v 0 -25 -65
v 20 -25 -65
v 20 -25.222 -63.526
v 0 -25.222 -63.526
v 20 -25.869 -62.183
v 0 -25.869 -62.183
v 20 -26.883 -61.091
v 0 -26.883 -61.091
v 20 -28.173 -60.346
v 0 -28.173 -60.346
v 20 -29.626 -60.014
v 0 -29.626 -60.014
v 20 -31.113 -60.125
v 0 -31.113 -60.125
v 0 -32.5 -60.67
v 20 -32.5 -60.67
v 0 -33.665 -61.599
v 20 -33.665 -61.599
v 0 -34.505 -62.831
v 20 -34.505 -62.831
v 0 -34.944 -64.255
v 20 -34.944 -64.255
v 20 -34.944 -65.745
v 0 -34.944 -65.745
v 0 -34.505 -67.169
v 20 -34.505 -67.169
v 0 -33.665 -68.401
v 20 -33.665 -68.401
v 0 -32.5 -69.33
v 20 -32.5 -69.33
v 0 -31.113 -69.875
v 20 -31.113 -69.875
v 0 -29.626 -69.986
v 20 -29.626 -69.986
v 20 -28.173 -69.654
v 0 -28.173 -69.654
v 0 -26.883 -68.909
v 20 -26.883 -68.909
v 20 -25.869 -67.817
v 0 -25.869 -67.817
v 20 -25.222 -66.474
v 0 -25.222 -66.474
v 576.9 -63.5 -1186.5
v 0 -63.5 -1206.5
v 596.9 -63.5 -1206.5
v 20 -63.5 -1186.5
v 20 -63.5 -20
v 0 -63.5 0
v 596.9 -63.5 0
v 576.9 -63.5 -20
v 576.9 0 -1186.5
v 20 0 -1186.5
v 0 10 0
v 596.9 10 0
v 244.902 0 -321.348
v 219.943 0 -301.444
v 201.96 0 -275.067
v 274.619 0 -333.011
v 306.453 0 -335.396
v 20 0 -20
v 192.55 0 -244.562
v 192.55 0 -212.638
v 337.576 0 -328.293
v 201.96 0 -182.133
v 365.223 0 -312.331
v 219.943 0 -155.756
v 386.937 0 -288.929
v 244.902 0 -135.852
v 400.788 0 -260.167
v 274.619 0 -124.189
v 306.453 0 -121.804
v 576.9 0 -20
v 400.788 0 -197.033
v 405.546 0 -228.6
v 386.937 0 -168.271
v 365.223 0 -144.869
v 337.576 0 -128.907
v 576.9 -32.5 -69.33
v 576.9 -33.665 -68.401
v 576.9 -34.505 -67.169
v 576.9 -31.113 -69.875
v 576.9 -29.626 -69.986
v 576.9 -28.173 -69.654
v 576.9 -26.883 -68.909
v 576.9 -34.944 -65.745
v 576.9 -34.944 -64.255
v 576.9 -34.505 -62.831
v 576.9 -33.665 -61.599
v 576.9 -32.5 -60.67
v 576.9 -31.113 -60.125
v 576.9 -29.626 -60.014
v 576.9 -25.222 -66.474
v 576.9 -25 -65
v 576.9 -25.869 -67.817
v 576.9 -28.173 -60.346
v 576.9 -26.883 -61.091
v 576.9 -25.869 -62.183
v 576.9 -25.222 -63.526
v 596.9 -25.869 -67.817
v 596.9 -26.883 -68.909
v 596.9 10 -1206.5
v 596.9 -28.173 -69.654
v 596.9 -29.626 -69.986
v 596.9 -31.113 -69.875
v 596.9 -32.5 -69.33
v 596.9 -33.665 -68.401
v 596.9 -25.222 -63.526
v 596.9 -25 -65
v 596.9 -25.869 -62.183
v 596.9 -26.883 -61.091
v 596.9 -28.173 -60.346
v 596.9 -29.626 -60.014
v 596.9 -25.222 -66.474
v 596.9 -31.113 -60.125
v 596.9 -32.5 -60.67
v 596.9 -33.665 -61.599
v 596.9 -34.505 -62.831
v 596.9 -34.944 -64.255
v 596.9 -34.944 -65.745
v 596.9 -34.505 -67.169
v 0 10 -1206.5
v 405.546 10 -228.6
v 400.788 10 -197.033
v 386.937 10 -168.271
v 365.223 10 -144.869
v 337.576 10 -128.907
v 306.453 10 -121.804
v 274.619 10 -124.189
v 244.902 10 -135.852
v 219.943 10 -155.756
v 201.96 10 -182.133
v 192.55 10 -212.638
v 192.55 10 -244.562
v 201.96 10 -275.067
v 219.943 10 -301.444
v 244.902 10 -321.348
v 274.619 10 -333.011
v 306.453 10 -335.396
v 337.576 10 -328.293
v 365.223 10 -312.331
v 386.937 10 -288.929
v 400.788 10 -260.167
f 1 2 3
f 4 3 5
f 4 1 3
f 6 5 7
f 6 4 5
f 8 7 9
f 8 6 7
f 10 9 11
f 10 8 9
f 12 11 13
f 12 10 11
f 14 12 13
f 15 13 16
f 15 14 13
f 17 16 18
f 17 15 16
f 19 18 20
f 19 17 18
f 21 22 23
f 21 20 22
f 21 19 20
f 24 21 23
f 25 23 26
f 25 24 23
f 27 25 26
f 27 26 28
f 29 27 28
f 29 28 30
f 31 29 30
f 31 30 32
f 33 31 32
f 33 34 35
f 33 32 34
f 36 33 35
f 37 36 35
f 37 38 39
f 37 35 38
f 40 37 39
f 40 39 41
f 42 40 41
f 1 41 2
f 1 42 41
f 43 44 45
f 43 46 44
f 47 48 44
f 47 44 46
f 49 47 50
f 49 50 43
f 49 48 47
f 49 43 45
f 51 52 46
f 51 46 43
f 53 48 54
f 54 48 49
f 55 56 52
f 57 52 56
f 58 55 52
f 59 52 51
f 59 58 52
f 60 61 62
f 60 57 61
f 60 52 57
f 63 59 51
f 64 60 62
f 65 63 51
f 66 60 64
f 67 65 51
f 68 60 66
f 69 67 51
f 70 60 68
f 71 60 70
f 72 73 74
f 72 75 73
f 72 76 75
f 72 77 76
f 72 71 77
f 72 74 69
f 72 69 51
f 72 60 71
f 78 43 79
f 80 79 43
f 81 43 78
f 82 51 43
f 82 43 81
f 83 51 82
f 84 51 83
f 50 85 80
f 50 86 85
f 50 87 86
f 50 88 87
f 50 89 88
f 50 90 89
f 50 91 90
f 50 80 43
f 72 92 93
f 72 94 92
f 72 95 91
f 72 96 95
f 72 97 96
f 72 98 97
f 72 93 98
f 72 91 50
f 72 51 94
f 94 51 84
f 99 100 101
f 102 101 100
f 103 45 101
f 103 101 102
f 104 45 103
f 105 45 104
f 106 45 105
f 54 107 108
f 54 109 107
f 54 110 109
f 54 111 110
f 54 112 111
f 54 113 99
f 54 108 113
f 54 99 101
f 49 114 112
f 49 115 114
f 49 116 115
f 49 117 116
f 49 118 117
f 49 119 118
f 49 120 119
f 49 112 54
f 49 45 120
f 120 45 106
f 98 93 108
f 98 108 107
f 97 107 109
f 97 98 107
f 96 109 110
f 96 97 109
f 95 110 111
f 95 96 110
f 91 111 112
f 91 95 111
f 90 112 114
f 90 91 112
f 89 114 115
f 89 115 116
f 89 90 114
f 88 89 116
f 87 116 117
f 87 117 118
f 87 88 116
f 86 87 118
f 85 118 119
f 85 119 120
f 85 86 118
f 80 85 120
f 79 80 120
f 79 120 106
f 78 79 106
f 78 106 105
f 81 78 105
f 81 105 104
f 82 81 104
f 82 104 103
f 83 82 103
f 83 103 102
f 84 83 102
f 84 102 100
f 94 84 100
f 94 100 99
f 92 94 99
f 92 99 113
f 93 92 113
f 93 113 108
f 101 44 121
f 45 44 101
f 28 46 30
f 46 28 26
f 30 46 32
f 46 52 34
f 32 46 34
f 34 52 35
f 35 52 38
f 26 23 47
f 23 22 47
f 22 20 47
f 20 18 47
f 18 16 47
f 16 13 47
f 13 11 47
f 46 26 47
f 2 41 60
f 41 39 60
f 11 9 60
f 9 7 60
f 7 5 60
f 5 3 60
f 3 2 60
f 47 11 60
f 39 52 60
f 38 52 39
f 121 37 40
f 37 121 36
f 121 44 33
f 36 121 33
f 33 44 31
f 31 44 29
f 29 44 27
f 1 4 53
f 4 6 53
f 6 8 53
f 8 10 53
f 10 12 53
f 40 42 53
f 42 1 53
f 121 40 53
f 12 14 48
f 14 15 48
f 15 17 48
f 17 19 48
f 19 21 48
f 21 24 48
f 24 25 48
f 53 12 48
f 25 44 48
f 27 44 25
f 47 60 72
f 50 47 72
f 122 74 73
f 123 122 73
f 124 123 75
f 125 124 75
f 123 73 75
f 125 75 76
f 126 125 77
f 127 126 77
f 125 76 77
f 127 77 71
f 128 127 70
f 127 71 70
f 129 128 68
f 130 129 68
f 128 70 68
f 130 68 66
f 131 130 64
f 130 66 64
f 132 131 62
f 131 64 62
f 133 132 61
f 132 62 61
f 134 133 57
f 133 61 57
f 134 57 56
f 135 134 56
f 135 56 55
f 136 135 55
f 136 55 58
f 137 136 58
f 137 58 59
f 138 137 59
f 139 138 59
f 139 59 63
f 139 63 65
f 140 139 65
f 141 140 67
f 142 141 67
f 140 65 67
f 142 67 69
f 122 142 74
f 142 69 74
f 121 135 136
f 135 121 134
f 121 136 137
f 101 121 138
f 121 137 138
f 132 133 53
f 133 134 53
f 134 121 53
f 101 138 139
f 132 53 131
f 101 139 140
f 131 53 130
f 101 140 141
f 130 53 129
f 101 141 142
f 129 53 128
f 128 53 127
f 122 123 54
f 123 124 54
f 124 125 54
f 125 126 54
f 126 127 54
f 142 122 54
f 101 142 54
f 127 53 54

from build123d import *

# Parameters (mm, degrees)
F0_W     = 596.9
F0_H     = 1206.5
F0_W_2   = 556.9
F0_H_2   = 1166.5
F1_DEPTH = 63.5
F2_W     = 596.9
F2_H     = 1206.5
F2_R     = 107.095768
F3_DEPTH = 10
F4_R     = 5
F5_DEPTH = 596.9


with BuildPart() as f1:
    # F0 (on Front) → F1 (new body)
    with BuildSketch(Plane.XZ):
        with Locations((298.45, -603.25)):
            Rectangle(F0_W, F0_H)
        with Locations((298.45, -603.25)):
            Rectangle(F0_W_2, F0_H_2, mode=Mode.SUBTRACT)
    extrude(amount=F1_DEPTH)

    # F2 (on Front) → F3 (join)
    with BuildSketch(Plane.XZ):
        with Locations((298.45, -603.25)):
            Rectangle(F2_W, F2_H)
        with Locations((298.45, -228.6)):
            Circle(F2_R, mode=Mode.SUBTRACT)
    extrude(amount=-F3_DEPTH)

    # F4 (on Right) → F5 (cut, through all)
    with BuildSketch(Plane.YZ):
        with Locations((-30, -65)):
            Circle(F4_R)
    extrude(amount=F5_DEPTH, mode=Mode.SUBTRACT)


solid = f1.part
